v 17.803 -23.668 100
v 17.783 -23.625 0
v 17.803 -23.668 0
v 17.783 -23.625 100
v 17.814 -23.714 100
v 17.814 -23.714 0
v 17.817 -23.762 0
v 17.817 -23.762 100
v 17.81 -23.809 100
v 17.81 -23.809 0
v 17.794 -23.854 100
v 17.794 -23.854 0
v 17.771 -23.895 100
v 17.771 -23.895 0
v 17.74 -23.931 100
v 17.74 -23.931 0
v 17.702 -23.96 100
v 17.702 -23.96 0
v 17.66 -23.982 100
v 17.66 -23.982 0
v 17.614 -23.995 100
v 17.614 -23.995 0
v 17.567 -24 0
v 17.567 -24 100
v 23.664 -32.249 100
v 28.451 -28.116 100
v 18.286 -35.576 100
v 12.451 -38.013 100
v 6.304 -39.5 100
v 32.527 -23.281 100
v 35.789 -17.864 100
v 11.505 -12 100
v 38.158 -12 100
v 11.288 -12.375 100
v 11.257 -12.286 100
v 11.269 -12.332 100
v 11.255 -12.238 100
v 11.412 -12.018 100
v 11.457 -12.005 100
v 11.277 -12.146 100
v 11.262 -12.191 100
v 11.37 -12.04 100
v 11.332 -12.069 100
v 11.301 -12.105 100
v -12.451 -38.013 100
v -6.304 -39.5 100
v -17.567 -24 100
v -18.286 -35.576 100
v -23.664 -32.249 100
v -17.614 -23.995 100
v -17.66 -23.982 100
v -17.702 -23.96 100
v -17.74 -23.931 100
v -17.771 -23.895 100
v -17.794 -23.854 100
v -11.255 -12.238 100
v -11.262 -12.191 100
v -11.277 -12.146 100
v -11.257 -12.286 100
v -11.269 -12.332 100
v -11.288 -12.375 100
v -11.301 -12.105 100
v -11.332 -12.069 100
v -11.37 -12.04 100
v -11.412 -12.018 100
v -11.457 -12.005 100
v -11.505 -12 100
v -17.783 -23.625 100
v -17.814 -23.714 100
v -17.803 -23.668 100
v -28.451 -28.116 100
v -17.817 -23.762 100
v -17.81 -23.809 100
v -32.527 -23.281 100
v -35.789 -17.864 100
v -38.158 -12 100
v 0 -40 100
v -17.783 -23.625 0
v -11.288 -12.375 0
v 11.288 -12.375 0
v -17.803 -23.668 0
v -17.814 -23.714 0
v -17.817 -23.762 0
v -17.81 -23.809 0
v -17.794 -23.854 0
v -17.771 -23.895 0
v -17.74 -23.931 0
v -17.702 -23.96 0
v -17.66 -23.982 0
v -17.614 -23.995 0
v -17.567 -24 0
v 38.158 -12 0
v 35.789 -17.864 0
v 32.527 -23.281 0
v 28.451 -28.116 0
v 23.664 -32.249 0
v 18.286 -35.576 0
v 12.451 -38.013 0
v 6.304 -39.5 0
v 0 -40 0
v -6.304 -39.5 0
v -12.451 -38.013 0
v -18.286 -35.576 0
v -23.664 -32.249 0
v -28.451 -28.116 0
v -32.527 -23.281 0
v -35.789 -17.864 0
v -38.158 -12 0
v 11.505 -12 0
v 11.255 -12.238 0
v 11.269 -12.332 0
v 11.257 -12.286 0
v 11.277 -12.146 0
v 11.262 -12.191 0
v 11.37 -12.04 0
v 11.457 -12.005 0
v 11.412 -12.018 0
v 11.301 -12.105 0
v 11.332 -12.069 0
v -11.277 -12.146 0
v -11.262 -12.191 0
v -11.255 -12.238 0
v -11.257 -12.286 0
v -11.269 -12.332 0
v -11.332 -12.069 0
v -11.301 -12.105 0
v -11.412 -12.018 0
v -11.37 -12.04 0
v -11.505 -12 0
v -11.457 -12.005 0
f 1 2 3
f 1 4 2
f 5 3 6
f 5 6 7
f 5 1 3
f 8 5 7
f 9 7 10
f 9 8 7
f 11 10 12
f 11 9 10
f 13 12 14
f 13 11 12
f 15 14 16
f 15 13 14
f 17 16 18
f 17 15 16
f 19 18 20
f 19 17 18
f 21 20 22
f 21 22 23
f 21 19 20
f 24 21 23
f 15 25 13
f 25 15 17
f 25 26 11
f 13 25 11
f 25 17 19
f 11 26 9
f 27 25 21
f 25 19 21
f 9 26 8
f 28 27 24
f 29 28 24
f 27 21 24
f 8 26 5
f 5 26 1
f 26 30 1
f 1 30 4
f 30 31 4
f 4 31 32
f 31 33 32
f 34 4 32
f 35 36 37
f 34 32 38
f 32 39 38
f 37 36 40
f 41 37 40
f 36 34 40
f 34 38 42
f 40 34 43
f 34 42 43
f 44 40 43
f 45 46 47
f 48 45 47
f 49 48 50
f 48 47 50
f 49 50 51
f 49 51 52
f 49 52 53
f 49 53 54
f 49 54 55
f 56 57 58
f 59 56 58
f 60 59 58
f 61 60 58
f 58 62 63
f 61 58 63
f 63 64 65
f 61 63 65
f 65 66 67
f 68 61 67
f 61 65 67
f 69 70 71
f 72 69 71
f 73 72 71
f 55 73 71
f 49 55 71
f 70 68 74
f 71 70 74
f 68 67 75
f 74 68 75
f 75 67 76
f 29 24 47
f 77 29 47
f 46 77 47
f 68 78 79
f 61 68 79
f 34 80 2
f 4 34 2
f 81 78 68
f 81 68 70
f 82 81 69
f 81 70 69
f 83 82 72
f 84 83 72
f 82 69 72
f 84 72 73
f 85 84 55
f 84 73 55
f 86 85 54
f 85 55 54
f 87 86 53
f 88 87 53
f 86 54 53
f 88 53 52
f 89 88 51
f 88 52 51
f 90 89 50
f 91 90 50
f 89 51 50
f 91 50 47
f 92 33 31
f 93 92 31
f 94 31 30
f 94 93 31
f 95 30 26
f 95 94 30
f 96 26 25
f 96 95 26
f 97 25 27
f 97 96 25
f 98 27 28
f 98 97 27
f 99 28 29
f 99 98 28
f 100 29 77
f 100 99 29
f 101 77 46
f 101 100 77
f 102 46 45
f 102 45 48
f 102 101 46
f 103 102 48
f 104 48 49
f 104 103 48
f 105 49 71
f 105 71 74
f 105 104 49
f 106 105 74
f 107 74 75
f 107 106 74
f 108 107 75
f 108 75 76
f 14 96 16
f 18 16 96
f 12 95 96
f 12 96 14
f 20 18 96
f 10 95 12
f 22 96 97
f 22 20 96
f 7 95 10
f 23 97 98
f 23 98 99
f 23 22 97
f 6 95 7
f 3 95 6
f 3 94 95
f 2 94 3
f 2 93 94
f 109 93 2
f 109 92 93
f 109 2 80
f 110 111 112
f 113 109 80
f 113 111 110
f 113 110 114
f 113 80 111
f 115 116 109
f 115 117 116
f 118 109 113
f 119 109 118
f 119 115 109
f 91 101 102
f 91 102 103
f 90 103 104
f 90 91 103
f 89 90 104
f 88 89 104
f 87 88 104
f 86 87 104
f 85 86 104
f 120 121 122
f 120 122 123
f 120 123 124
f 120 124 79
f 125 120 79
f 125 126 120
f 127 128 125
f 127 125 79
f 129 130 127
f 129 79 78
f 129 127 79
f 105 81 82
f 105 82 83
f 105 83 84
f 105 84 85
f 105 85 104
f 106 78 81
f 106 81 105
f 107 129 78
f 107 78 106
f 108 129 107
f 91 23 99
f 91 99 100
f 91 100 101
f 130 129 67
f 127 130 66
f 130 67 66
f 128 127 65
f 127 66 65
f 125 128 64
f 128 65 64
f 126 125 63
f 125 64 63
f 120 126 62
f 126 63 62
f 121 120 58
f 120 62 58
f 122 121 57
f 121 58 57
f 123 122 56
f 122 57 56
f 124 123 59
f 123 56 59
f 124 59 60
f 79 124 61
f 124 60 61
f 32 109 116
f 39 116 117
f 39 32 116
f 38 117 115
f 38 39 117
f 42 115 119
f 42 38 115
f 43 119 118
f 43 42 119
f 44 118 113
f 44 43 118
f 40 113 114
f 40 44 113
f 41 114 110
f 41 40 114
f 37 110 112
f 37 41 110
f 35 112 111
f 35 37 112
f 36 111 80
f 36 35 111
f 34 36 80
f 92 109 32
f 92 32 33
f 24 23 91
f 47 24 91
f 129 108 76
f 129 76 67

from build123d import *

# Parameters (mm, degrees)
BOSS_EXTRUDE1_DEPTH = 100
CUT_EXTRUDE1_DEPTH  = 101
FILLET1_R           = 0.25


with BuildPart() as part:
    # Sketch2 → Boss-Extrude1 (new body)
    with BuildSketch(Plane.XY):
        with BuildLine():
            Line((-38.157568057, -12), (38.157568057, -12))
            ThreePointArc((38.157568057, -12), (0, -40), (-38.157568057, -12))
        make_face()
    extrude(amount=BOSS_EXTRUDE1_DEPTH)

    # Sketch3 → Cut-Extrude1 (cut, through all)
    with BuildSketch(Plane(origin=(0, 0, 0), x_dir=(-1, 0, 0), z_dir=(0, 0, -1))):
        Polygon((-11.07179677, -12), (-18, -24), (18, -24), (11.07179677, -12), align=None)
    extrude(amount=-CUT_EXTRUDE1_DEPTH, mode=Mode.SUBTRACT)

    # Fillet1
    fillet1_edges = [part.edges().sort_by_distance(p)[0] for p in [
        (11.07179677, -12, 50),
        (-11.07179677, -12, 50),
        (-18, -24, 50),
        (18, -24, 50),
    ]]
    fillet(fillet1_edges, radius=FILLET1_R)


solid = part.part
